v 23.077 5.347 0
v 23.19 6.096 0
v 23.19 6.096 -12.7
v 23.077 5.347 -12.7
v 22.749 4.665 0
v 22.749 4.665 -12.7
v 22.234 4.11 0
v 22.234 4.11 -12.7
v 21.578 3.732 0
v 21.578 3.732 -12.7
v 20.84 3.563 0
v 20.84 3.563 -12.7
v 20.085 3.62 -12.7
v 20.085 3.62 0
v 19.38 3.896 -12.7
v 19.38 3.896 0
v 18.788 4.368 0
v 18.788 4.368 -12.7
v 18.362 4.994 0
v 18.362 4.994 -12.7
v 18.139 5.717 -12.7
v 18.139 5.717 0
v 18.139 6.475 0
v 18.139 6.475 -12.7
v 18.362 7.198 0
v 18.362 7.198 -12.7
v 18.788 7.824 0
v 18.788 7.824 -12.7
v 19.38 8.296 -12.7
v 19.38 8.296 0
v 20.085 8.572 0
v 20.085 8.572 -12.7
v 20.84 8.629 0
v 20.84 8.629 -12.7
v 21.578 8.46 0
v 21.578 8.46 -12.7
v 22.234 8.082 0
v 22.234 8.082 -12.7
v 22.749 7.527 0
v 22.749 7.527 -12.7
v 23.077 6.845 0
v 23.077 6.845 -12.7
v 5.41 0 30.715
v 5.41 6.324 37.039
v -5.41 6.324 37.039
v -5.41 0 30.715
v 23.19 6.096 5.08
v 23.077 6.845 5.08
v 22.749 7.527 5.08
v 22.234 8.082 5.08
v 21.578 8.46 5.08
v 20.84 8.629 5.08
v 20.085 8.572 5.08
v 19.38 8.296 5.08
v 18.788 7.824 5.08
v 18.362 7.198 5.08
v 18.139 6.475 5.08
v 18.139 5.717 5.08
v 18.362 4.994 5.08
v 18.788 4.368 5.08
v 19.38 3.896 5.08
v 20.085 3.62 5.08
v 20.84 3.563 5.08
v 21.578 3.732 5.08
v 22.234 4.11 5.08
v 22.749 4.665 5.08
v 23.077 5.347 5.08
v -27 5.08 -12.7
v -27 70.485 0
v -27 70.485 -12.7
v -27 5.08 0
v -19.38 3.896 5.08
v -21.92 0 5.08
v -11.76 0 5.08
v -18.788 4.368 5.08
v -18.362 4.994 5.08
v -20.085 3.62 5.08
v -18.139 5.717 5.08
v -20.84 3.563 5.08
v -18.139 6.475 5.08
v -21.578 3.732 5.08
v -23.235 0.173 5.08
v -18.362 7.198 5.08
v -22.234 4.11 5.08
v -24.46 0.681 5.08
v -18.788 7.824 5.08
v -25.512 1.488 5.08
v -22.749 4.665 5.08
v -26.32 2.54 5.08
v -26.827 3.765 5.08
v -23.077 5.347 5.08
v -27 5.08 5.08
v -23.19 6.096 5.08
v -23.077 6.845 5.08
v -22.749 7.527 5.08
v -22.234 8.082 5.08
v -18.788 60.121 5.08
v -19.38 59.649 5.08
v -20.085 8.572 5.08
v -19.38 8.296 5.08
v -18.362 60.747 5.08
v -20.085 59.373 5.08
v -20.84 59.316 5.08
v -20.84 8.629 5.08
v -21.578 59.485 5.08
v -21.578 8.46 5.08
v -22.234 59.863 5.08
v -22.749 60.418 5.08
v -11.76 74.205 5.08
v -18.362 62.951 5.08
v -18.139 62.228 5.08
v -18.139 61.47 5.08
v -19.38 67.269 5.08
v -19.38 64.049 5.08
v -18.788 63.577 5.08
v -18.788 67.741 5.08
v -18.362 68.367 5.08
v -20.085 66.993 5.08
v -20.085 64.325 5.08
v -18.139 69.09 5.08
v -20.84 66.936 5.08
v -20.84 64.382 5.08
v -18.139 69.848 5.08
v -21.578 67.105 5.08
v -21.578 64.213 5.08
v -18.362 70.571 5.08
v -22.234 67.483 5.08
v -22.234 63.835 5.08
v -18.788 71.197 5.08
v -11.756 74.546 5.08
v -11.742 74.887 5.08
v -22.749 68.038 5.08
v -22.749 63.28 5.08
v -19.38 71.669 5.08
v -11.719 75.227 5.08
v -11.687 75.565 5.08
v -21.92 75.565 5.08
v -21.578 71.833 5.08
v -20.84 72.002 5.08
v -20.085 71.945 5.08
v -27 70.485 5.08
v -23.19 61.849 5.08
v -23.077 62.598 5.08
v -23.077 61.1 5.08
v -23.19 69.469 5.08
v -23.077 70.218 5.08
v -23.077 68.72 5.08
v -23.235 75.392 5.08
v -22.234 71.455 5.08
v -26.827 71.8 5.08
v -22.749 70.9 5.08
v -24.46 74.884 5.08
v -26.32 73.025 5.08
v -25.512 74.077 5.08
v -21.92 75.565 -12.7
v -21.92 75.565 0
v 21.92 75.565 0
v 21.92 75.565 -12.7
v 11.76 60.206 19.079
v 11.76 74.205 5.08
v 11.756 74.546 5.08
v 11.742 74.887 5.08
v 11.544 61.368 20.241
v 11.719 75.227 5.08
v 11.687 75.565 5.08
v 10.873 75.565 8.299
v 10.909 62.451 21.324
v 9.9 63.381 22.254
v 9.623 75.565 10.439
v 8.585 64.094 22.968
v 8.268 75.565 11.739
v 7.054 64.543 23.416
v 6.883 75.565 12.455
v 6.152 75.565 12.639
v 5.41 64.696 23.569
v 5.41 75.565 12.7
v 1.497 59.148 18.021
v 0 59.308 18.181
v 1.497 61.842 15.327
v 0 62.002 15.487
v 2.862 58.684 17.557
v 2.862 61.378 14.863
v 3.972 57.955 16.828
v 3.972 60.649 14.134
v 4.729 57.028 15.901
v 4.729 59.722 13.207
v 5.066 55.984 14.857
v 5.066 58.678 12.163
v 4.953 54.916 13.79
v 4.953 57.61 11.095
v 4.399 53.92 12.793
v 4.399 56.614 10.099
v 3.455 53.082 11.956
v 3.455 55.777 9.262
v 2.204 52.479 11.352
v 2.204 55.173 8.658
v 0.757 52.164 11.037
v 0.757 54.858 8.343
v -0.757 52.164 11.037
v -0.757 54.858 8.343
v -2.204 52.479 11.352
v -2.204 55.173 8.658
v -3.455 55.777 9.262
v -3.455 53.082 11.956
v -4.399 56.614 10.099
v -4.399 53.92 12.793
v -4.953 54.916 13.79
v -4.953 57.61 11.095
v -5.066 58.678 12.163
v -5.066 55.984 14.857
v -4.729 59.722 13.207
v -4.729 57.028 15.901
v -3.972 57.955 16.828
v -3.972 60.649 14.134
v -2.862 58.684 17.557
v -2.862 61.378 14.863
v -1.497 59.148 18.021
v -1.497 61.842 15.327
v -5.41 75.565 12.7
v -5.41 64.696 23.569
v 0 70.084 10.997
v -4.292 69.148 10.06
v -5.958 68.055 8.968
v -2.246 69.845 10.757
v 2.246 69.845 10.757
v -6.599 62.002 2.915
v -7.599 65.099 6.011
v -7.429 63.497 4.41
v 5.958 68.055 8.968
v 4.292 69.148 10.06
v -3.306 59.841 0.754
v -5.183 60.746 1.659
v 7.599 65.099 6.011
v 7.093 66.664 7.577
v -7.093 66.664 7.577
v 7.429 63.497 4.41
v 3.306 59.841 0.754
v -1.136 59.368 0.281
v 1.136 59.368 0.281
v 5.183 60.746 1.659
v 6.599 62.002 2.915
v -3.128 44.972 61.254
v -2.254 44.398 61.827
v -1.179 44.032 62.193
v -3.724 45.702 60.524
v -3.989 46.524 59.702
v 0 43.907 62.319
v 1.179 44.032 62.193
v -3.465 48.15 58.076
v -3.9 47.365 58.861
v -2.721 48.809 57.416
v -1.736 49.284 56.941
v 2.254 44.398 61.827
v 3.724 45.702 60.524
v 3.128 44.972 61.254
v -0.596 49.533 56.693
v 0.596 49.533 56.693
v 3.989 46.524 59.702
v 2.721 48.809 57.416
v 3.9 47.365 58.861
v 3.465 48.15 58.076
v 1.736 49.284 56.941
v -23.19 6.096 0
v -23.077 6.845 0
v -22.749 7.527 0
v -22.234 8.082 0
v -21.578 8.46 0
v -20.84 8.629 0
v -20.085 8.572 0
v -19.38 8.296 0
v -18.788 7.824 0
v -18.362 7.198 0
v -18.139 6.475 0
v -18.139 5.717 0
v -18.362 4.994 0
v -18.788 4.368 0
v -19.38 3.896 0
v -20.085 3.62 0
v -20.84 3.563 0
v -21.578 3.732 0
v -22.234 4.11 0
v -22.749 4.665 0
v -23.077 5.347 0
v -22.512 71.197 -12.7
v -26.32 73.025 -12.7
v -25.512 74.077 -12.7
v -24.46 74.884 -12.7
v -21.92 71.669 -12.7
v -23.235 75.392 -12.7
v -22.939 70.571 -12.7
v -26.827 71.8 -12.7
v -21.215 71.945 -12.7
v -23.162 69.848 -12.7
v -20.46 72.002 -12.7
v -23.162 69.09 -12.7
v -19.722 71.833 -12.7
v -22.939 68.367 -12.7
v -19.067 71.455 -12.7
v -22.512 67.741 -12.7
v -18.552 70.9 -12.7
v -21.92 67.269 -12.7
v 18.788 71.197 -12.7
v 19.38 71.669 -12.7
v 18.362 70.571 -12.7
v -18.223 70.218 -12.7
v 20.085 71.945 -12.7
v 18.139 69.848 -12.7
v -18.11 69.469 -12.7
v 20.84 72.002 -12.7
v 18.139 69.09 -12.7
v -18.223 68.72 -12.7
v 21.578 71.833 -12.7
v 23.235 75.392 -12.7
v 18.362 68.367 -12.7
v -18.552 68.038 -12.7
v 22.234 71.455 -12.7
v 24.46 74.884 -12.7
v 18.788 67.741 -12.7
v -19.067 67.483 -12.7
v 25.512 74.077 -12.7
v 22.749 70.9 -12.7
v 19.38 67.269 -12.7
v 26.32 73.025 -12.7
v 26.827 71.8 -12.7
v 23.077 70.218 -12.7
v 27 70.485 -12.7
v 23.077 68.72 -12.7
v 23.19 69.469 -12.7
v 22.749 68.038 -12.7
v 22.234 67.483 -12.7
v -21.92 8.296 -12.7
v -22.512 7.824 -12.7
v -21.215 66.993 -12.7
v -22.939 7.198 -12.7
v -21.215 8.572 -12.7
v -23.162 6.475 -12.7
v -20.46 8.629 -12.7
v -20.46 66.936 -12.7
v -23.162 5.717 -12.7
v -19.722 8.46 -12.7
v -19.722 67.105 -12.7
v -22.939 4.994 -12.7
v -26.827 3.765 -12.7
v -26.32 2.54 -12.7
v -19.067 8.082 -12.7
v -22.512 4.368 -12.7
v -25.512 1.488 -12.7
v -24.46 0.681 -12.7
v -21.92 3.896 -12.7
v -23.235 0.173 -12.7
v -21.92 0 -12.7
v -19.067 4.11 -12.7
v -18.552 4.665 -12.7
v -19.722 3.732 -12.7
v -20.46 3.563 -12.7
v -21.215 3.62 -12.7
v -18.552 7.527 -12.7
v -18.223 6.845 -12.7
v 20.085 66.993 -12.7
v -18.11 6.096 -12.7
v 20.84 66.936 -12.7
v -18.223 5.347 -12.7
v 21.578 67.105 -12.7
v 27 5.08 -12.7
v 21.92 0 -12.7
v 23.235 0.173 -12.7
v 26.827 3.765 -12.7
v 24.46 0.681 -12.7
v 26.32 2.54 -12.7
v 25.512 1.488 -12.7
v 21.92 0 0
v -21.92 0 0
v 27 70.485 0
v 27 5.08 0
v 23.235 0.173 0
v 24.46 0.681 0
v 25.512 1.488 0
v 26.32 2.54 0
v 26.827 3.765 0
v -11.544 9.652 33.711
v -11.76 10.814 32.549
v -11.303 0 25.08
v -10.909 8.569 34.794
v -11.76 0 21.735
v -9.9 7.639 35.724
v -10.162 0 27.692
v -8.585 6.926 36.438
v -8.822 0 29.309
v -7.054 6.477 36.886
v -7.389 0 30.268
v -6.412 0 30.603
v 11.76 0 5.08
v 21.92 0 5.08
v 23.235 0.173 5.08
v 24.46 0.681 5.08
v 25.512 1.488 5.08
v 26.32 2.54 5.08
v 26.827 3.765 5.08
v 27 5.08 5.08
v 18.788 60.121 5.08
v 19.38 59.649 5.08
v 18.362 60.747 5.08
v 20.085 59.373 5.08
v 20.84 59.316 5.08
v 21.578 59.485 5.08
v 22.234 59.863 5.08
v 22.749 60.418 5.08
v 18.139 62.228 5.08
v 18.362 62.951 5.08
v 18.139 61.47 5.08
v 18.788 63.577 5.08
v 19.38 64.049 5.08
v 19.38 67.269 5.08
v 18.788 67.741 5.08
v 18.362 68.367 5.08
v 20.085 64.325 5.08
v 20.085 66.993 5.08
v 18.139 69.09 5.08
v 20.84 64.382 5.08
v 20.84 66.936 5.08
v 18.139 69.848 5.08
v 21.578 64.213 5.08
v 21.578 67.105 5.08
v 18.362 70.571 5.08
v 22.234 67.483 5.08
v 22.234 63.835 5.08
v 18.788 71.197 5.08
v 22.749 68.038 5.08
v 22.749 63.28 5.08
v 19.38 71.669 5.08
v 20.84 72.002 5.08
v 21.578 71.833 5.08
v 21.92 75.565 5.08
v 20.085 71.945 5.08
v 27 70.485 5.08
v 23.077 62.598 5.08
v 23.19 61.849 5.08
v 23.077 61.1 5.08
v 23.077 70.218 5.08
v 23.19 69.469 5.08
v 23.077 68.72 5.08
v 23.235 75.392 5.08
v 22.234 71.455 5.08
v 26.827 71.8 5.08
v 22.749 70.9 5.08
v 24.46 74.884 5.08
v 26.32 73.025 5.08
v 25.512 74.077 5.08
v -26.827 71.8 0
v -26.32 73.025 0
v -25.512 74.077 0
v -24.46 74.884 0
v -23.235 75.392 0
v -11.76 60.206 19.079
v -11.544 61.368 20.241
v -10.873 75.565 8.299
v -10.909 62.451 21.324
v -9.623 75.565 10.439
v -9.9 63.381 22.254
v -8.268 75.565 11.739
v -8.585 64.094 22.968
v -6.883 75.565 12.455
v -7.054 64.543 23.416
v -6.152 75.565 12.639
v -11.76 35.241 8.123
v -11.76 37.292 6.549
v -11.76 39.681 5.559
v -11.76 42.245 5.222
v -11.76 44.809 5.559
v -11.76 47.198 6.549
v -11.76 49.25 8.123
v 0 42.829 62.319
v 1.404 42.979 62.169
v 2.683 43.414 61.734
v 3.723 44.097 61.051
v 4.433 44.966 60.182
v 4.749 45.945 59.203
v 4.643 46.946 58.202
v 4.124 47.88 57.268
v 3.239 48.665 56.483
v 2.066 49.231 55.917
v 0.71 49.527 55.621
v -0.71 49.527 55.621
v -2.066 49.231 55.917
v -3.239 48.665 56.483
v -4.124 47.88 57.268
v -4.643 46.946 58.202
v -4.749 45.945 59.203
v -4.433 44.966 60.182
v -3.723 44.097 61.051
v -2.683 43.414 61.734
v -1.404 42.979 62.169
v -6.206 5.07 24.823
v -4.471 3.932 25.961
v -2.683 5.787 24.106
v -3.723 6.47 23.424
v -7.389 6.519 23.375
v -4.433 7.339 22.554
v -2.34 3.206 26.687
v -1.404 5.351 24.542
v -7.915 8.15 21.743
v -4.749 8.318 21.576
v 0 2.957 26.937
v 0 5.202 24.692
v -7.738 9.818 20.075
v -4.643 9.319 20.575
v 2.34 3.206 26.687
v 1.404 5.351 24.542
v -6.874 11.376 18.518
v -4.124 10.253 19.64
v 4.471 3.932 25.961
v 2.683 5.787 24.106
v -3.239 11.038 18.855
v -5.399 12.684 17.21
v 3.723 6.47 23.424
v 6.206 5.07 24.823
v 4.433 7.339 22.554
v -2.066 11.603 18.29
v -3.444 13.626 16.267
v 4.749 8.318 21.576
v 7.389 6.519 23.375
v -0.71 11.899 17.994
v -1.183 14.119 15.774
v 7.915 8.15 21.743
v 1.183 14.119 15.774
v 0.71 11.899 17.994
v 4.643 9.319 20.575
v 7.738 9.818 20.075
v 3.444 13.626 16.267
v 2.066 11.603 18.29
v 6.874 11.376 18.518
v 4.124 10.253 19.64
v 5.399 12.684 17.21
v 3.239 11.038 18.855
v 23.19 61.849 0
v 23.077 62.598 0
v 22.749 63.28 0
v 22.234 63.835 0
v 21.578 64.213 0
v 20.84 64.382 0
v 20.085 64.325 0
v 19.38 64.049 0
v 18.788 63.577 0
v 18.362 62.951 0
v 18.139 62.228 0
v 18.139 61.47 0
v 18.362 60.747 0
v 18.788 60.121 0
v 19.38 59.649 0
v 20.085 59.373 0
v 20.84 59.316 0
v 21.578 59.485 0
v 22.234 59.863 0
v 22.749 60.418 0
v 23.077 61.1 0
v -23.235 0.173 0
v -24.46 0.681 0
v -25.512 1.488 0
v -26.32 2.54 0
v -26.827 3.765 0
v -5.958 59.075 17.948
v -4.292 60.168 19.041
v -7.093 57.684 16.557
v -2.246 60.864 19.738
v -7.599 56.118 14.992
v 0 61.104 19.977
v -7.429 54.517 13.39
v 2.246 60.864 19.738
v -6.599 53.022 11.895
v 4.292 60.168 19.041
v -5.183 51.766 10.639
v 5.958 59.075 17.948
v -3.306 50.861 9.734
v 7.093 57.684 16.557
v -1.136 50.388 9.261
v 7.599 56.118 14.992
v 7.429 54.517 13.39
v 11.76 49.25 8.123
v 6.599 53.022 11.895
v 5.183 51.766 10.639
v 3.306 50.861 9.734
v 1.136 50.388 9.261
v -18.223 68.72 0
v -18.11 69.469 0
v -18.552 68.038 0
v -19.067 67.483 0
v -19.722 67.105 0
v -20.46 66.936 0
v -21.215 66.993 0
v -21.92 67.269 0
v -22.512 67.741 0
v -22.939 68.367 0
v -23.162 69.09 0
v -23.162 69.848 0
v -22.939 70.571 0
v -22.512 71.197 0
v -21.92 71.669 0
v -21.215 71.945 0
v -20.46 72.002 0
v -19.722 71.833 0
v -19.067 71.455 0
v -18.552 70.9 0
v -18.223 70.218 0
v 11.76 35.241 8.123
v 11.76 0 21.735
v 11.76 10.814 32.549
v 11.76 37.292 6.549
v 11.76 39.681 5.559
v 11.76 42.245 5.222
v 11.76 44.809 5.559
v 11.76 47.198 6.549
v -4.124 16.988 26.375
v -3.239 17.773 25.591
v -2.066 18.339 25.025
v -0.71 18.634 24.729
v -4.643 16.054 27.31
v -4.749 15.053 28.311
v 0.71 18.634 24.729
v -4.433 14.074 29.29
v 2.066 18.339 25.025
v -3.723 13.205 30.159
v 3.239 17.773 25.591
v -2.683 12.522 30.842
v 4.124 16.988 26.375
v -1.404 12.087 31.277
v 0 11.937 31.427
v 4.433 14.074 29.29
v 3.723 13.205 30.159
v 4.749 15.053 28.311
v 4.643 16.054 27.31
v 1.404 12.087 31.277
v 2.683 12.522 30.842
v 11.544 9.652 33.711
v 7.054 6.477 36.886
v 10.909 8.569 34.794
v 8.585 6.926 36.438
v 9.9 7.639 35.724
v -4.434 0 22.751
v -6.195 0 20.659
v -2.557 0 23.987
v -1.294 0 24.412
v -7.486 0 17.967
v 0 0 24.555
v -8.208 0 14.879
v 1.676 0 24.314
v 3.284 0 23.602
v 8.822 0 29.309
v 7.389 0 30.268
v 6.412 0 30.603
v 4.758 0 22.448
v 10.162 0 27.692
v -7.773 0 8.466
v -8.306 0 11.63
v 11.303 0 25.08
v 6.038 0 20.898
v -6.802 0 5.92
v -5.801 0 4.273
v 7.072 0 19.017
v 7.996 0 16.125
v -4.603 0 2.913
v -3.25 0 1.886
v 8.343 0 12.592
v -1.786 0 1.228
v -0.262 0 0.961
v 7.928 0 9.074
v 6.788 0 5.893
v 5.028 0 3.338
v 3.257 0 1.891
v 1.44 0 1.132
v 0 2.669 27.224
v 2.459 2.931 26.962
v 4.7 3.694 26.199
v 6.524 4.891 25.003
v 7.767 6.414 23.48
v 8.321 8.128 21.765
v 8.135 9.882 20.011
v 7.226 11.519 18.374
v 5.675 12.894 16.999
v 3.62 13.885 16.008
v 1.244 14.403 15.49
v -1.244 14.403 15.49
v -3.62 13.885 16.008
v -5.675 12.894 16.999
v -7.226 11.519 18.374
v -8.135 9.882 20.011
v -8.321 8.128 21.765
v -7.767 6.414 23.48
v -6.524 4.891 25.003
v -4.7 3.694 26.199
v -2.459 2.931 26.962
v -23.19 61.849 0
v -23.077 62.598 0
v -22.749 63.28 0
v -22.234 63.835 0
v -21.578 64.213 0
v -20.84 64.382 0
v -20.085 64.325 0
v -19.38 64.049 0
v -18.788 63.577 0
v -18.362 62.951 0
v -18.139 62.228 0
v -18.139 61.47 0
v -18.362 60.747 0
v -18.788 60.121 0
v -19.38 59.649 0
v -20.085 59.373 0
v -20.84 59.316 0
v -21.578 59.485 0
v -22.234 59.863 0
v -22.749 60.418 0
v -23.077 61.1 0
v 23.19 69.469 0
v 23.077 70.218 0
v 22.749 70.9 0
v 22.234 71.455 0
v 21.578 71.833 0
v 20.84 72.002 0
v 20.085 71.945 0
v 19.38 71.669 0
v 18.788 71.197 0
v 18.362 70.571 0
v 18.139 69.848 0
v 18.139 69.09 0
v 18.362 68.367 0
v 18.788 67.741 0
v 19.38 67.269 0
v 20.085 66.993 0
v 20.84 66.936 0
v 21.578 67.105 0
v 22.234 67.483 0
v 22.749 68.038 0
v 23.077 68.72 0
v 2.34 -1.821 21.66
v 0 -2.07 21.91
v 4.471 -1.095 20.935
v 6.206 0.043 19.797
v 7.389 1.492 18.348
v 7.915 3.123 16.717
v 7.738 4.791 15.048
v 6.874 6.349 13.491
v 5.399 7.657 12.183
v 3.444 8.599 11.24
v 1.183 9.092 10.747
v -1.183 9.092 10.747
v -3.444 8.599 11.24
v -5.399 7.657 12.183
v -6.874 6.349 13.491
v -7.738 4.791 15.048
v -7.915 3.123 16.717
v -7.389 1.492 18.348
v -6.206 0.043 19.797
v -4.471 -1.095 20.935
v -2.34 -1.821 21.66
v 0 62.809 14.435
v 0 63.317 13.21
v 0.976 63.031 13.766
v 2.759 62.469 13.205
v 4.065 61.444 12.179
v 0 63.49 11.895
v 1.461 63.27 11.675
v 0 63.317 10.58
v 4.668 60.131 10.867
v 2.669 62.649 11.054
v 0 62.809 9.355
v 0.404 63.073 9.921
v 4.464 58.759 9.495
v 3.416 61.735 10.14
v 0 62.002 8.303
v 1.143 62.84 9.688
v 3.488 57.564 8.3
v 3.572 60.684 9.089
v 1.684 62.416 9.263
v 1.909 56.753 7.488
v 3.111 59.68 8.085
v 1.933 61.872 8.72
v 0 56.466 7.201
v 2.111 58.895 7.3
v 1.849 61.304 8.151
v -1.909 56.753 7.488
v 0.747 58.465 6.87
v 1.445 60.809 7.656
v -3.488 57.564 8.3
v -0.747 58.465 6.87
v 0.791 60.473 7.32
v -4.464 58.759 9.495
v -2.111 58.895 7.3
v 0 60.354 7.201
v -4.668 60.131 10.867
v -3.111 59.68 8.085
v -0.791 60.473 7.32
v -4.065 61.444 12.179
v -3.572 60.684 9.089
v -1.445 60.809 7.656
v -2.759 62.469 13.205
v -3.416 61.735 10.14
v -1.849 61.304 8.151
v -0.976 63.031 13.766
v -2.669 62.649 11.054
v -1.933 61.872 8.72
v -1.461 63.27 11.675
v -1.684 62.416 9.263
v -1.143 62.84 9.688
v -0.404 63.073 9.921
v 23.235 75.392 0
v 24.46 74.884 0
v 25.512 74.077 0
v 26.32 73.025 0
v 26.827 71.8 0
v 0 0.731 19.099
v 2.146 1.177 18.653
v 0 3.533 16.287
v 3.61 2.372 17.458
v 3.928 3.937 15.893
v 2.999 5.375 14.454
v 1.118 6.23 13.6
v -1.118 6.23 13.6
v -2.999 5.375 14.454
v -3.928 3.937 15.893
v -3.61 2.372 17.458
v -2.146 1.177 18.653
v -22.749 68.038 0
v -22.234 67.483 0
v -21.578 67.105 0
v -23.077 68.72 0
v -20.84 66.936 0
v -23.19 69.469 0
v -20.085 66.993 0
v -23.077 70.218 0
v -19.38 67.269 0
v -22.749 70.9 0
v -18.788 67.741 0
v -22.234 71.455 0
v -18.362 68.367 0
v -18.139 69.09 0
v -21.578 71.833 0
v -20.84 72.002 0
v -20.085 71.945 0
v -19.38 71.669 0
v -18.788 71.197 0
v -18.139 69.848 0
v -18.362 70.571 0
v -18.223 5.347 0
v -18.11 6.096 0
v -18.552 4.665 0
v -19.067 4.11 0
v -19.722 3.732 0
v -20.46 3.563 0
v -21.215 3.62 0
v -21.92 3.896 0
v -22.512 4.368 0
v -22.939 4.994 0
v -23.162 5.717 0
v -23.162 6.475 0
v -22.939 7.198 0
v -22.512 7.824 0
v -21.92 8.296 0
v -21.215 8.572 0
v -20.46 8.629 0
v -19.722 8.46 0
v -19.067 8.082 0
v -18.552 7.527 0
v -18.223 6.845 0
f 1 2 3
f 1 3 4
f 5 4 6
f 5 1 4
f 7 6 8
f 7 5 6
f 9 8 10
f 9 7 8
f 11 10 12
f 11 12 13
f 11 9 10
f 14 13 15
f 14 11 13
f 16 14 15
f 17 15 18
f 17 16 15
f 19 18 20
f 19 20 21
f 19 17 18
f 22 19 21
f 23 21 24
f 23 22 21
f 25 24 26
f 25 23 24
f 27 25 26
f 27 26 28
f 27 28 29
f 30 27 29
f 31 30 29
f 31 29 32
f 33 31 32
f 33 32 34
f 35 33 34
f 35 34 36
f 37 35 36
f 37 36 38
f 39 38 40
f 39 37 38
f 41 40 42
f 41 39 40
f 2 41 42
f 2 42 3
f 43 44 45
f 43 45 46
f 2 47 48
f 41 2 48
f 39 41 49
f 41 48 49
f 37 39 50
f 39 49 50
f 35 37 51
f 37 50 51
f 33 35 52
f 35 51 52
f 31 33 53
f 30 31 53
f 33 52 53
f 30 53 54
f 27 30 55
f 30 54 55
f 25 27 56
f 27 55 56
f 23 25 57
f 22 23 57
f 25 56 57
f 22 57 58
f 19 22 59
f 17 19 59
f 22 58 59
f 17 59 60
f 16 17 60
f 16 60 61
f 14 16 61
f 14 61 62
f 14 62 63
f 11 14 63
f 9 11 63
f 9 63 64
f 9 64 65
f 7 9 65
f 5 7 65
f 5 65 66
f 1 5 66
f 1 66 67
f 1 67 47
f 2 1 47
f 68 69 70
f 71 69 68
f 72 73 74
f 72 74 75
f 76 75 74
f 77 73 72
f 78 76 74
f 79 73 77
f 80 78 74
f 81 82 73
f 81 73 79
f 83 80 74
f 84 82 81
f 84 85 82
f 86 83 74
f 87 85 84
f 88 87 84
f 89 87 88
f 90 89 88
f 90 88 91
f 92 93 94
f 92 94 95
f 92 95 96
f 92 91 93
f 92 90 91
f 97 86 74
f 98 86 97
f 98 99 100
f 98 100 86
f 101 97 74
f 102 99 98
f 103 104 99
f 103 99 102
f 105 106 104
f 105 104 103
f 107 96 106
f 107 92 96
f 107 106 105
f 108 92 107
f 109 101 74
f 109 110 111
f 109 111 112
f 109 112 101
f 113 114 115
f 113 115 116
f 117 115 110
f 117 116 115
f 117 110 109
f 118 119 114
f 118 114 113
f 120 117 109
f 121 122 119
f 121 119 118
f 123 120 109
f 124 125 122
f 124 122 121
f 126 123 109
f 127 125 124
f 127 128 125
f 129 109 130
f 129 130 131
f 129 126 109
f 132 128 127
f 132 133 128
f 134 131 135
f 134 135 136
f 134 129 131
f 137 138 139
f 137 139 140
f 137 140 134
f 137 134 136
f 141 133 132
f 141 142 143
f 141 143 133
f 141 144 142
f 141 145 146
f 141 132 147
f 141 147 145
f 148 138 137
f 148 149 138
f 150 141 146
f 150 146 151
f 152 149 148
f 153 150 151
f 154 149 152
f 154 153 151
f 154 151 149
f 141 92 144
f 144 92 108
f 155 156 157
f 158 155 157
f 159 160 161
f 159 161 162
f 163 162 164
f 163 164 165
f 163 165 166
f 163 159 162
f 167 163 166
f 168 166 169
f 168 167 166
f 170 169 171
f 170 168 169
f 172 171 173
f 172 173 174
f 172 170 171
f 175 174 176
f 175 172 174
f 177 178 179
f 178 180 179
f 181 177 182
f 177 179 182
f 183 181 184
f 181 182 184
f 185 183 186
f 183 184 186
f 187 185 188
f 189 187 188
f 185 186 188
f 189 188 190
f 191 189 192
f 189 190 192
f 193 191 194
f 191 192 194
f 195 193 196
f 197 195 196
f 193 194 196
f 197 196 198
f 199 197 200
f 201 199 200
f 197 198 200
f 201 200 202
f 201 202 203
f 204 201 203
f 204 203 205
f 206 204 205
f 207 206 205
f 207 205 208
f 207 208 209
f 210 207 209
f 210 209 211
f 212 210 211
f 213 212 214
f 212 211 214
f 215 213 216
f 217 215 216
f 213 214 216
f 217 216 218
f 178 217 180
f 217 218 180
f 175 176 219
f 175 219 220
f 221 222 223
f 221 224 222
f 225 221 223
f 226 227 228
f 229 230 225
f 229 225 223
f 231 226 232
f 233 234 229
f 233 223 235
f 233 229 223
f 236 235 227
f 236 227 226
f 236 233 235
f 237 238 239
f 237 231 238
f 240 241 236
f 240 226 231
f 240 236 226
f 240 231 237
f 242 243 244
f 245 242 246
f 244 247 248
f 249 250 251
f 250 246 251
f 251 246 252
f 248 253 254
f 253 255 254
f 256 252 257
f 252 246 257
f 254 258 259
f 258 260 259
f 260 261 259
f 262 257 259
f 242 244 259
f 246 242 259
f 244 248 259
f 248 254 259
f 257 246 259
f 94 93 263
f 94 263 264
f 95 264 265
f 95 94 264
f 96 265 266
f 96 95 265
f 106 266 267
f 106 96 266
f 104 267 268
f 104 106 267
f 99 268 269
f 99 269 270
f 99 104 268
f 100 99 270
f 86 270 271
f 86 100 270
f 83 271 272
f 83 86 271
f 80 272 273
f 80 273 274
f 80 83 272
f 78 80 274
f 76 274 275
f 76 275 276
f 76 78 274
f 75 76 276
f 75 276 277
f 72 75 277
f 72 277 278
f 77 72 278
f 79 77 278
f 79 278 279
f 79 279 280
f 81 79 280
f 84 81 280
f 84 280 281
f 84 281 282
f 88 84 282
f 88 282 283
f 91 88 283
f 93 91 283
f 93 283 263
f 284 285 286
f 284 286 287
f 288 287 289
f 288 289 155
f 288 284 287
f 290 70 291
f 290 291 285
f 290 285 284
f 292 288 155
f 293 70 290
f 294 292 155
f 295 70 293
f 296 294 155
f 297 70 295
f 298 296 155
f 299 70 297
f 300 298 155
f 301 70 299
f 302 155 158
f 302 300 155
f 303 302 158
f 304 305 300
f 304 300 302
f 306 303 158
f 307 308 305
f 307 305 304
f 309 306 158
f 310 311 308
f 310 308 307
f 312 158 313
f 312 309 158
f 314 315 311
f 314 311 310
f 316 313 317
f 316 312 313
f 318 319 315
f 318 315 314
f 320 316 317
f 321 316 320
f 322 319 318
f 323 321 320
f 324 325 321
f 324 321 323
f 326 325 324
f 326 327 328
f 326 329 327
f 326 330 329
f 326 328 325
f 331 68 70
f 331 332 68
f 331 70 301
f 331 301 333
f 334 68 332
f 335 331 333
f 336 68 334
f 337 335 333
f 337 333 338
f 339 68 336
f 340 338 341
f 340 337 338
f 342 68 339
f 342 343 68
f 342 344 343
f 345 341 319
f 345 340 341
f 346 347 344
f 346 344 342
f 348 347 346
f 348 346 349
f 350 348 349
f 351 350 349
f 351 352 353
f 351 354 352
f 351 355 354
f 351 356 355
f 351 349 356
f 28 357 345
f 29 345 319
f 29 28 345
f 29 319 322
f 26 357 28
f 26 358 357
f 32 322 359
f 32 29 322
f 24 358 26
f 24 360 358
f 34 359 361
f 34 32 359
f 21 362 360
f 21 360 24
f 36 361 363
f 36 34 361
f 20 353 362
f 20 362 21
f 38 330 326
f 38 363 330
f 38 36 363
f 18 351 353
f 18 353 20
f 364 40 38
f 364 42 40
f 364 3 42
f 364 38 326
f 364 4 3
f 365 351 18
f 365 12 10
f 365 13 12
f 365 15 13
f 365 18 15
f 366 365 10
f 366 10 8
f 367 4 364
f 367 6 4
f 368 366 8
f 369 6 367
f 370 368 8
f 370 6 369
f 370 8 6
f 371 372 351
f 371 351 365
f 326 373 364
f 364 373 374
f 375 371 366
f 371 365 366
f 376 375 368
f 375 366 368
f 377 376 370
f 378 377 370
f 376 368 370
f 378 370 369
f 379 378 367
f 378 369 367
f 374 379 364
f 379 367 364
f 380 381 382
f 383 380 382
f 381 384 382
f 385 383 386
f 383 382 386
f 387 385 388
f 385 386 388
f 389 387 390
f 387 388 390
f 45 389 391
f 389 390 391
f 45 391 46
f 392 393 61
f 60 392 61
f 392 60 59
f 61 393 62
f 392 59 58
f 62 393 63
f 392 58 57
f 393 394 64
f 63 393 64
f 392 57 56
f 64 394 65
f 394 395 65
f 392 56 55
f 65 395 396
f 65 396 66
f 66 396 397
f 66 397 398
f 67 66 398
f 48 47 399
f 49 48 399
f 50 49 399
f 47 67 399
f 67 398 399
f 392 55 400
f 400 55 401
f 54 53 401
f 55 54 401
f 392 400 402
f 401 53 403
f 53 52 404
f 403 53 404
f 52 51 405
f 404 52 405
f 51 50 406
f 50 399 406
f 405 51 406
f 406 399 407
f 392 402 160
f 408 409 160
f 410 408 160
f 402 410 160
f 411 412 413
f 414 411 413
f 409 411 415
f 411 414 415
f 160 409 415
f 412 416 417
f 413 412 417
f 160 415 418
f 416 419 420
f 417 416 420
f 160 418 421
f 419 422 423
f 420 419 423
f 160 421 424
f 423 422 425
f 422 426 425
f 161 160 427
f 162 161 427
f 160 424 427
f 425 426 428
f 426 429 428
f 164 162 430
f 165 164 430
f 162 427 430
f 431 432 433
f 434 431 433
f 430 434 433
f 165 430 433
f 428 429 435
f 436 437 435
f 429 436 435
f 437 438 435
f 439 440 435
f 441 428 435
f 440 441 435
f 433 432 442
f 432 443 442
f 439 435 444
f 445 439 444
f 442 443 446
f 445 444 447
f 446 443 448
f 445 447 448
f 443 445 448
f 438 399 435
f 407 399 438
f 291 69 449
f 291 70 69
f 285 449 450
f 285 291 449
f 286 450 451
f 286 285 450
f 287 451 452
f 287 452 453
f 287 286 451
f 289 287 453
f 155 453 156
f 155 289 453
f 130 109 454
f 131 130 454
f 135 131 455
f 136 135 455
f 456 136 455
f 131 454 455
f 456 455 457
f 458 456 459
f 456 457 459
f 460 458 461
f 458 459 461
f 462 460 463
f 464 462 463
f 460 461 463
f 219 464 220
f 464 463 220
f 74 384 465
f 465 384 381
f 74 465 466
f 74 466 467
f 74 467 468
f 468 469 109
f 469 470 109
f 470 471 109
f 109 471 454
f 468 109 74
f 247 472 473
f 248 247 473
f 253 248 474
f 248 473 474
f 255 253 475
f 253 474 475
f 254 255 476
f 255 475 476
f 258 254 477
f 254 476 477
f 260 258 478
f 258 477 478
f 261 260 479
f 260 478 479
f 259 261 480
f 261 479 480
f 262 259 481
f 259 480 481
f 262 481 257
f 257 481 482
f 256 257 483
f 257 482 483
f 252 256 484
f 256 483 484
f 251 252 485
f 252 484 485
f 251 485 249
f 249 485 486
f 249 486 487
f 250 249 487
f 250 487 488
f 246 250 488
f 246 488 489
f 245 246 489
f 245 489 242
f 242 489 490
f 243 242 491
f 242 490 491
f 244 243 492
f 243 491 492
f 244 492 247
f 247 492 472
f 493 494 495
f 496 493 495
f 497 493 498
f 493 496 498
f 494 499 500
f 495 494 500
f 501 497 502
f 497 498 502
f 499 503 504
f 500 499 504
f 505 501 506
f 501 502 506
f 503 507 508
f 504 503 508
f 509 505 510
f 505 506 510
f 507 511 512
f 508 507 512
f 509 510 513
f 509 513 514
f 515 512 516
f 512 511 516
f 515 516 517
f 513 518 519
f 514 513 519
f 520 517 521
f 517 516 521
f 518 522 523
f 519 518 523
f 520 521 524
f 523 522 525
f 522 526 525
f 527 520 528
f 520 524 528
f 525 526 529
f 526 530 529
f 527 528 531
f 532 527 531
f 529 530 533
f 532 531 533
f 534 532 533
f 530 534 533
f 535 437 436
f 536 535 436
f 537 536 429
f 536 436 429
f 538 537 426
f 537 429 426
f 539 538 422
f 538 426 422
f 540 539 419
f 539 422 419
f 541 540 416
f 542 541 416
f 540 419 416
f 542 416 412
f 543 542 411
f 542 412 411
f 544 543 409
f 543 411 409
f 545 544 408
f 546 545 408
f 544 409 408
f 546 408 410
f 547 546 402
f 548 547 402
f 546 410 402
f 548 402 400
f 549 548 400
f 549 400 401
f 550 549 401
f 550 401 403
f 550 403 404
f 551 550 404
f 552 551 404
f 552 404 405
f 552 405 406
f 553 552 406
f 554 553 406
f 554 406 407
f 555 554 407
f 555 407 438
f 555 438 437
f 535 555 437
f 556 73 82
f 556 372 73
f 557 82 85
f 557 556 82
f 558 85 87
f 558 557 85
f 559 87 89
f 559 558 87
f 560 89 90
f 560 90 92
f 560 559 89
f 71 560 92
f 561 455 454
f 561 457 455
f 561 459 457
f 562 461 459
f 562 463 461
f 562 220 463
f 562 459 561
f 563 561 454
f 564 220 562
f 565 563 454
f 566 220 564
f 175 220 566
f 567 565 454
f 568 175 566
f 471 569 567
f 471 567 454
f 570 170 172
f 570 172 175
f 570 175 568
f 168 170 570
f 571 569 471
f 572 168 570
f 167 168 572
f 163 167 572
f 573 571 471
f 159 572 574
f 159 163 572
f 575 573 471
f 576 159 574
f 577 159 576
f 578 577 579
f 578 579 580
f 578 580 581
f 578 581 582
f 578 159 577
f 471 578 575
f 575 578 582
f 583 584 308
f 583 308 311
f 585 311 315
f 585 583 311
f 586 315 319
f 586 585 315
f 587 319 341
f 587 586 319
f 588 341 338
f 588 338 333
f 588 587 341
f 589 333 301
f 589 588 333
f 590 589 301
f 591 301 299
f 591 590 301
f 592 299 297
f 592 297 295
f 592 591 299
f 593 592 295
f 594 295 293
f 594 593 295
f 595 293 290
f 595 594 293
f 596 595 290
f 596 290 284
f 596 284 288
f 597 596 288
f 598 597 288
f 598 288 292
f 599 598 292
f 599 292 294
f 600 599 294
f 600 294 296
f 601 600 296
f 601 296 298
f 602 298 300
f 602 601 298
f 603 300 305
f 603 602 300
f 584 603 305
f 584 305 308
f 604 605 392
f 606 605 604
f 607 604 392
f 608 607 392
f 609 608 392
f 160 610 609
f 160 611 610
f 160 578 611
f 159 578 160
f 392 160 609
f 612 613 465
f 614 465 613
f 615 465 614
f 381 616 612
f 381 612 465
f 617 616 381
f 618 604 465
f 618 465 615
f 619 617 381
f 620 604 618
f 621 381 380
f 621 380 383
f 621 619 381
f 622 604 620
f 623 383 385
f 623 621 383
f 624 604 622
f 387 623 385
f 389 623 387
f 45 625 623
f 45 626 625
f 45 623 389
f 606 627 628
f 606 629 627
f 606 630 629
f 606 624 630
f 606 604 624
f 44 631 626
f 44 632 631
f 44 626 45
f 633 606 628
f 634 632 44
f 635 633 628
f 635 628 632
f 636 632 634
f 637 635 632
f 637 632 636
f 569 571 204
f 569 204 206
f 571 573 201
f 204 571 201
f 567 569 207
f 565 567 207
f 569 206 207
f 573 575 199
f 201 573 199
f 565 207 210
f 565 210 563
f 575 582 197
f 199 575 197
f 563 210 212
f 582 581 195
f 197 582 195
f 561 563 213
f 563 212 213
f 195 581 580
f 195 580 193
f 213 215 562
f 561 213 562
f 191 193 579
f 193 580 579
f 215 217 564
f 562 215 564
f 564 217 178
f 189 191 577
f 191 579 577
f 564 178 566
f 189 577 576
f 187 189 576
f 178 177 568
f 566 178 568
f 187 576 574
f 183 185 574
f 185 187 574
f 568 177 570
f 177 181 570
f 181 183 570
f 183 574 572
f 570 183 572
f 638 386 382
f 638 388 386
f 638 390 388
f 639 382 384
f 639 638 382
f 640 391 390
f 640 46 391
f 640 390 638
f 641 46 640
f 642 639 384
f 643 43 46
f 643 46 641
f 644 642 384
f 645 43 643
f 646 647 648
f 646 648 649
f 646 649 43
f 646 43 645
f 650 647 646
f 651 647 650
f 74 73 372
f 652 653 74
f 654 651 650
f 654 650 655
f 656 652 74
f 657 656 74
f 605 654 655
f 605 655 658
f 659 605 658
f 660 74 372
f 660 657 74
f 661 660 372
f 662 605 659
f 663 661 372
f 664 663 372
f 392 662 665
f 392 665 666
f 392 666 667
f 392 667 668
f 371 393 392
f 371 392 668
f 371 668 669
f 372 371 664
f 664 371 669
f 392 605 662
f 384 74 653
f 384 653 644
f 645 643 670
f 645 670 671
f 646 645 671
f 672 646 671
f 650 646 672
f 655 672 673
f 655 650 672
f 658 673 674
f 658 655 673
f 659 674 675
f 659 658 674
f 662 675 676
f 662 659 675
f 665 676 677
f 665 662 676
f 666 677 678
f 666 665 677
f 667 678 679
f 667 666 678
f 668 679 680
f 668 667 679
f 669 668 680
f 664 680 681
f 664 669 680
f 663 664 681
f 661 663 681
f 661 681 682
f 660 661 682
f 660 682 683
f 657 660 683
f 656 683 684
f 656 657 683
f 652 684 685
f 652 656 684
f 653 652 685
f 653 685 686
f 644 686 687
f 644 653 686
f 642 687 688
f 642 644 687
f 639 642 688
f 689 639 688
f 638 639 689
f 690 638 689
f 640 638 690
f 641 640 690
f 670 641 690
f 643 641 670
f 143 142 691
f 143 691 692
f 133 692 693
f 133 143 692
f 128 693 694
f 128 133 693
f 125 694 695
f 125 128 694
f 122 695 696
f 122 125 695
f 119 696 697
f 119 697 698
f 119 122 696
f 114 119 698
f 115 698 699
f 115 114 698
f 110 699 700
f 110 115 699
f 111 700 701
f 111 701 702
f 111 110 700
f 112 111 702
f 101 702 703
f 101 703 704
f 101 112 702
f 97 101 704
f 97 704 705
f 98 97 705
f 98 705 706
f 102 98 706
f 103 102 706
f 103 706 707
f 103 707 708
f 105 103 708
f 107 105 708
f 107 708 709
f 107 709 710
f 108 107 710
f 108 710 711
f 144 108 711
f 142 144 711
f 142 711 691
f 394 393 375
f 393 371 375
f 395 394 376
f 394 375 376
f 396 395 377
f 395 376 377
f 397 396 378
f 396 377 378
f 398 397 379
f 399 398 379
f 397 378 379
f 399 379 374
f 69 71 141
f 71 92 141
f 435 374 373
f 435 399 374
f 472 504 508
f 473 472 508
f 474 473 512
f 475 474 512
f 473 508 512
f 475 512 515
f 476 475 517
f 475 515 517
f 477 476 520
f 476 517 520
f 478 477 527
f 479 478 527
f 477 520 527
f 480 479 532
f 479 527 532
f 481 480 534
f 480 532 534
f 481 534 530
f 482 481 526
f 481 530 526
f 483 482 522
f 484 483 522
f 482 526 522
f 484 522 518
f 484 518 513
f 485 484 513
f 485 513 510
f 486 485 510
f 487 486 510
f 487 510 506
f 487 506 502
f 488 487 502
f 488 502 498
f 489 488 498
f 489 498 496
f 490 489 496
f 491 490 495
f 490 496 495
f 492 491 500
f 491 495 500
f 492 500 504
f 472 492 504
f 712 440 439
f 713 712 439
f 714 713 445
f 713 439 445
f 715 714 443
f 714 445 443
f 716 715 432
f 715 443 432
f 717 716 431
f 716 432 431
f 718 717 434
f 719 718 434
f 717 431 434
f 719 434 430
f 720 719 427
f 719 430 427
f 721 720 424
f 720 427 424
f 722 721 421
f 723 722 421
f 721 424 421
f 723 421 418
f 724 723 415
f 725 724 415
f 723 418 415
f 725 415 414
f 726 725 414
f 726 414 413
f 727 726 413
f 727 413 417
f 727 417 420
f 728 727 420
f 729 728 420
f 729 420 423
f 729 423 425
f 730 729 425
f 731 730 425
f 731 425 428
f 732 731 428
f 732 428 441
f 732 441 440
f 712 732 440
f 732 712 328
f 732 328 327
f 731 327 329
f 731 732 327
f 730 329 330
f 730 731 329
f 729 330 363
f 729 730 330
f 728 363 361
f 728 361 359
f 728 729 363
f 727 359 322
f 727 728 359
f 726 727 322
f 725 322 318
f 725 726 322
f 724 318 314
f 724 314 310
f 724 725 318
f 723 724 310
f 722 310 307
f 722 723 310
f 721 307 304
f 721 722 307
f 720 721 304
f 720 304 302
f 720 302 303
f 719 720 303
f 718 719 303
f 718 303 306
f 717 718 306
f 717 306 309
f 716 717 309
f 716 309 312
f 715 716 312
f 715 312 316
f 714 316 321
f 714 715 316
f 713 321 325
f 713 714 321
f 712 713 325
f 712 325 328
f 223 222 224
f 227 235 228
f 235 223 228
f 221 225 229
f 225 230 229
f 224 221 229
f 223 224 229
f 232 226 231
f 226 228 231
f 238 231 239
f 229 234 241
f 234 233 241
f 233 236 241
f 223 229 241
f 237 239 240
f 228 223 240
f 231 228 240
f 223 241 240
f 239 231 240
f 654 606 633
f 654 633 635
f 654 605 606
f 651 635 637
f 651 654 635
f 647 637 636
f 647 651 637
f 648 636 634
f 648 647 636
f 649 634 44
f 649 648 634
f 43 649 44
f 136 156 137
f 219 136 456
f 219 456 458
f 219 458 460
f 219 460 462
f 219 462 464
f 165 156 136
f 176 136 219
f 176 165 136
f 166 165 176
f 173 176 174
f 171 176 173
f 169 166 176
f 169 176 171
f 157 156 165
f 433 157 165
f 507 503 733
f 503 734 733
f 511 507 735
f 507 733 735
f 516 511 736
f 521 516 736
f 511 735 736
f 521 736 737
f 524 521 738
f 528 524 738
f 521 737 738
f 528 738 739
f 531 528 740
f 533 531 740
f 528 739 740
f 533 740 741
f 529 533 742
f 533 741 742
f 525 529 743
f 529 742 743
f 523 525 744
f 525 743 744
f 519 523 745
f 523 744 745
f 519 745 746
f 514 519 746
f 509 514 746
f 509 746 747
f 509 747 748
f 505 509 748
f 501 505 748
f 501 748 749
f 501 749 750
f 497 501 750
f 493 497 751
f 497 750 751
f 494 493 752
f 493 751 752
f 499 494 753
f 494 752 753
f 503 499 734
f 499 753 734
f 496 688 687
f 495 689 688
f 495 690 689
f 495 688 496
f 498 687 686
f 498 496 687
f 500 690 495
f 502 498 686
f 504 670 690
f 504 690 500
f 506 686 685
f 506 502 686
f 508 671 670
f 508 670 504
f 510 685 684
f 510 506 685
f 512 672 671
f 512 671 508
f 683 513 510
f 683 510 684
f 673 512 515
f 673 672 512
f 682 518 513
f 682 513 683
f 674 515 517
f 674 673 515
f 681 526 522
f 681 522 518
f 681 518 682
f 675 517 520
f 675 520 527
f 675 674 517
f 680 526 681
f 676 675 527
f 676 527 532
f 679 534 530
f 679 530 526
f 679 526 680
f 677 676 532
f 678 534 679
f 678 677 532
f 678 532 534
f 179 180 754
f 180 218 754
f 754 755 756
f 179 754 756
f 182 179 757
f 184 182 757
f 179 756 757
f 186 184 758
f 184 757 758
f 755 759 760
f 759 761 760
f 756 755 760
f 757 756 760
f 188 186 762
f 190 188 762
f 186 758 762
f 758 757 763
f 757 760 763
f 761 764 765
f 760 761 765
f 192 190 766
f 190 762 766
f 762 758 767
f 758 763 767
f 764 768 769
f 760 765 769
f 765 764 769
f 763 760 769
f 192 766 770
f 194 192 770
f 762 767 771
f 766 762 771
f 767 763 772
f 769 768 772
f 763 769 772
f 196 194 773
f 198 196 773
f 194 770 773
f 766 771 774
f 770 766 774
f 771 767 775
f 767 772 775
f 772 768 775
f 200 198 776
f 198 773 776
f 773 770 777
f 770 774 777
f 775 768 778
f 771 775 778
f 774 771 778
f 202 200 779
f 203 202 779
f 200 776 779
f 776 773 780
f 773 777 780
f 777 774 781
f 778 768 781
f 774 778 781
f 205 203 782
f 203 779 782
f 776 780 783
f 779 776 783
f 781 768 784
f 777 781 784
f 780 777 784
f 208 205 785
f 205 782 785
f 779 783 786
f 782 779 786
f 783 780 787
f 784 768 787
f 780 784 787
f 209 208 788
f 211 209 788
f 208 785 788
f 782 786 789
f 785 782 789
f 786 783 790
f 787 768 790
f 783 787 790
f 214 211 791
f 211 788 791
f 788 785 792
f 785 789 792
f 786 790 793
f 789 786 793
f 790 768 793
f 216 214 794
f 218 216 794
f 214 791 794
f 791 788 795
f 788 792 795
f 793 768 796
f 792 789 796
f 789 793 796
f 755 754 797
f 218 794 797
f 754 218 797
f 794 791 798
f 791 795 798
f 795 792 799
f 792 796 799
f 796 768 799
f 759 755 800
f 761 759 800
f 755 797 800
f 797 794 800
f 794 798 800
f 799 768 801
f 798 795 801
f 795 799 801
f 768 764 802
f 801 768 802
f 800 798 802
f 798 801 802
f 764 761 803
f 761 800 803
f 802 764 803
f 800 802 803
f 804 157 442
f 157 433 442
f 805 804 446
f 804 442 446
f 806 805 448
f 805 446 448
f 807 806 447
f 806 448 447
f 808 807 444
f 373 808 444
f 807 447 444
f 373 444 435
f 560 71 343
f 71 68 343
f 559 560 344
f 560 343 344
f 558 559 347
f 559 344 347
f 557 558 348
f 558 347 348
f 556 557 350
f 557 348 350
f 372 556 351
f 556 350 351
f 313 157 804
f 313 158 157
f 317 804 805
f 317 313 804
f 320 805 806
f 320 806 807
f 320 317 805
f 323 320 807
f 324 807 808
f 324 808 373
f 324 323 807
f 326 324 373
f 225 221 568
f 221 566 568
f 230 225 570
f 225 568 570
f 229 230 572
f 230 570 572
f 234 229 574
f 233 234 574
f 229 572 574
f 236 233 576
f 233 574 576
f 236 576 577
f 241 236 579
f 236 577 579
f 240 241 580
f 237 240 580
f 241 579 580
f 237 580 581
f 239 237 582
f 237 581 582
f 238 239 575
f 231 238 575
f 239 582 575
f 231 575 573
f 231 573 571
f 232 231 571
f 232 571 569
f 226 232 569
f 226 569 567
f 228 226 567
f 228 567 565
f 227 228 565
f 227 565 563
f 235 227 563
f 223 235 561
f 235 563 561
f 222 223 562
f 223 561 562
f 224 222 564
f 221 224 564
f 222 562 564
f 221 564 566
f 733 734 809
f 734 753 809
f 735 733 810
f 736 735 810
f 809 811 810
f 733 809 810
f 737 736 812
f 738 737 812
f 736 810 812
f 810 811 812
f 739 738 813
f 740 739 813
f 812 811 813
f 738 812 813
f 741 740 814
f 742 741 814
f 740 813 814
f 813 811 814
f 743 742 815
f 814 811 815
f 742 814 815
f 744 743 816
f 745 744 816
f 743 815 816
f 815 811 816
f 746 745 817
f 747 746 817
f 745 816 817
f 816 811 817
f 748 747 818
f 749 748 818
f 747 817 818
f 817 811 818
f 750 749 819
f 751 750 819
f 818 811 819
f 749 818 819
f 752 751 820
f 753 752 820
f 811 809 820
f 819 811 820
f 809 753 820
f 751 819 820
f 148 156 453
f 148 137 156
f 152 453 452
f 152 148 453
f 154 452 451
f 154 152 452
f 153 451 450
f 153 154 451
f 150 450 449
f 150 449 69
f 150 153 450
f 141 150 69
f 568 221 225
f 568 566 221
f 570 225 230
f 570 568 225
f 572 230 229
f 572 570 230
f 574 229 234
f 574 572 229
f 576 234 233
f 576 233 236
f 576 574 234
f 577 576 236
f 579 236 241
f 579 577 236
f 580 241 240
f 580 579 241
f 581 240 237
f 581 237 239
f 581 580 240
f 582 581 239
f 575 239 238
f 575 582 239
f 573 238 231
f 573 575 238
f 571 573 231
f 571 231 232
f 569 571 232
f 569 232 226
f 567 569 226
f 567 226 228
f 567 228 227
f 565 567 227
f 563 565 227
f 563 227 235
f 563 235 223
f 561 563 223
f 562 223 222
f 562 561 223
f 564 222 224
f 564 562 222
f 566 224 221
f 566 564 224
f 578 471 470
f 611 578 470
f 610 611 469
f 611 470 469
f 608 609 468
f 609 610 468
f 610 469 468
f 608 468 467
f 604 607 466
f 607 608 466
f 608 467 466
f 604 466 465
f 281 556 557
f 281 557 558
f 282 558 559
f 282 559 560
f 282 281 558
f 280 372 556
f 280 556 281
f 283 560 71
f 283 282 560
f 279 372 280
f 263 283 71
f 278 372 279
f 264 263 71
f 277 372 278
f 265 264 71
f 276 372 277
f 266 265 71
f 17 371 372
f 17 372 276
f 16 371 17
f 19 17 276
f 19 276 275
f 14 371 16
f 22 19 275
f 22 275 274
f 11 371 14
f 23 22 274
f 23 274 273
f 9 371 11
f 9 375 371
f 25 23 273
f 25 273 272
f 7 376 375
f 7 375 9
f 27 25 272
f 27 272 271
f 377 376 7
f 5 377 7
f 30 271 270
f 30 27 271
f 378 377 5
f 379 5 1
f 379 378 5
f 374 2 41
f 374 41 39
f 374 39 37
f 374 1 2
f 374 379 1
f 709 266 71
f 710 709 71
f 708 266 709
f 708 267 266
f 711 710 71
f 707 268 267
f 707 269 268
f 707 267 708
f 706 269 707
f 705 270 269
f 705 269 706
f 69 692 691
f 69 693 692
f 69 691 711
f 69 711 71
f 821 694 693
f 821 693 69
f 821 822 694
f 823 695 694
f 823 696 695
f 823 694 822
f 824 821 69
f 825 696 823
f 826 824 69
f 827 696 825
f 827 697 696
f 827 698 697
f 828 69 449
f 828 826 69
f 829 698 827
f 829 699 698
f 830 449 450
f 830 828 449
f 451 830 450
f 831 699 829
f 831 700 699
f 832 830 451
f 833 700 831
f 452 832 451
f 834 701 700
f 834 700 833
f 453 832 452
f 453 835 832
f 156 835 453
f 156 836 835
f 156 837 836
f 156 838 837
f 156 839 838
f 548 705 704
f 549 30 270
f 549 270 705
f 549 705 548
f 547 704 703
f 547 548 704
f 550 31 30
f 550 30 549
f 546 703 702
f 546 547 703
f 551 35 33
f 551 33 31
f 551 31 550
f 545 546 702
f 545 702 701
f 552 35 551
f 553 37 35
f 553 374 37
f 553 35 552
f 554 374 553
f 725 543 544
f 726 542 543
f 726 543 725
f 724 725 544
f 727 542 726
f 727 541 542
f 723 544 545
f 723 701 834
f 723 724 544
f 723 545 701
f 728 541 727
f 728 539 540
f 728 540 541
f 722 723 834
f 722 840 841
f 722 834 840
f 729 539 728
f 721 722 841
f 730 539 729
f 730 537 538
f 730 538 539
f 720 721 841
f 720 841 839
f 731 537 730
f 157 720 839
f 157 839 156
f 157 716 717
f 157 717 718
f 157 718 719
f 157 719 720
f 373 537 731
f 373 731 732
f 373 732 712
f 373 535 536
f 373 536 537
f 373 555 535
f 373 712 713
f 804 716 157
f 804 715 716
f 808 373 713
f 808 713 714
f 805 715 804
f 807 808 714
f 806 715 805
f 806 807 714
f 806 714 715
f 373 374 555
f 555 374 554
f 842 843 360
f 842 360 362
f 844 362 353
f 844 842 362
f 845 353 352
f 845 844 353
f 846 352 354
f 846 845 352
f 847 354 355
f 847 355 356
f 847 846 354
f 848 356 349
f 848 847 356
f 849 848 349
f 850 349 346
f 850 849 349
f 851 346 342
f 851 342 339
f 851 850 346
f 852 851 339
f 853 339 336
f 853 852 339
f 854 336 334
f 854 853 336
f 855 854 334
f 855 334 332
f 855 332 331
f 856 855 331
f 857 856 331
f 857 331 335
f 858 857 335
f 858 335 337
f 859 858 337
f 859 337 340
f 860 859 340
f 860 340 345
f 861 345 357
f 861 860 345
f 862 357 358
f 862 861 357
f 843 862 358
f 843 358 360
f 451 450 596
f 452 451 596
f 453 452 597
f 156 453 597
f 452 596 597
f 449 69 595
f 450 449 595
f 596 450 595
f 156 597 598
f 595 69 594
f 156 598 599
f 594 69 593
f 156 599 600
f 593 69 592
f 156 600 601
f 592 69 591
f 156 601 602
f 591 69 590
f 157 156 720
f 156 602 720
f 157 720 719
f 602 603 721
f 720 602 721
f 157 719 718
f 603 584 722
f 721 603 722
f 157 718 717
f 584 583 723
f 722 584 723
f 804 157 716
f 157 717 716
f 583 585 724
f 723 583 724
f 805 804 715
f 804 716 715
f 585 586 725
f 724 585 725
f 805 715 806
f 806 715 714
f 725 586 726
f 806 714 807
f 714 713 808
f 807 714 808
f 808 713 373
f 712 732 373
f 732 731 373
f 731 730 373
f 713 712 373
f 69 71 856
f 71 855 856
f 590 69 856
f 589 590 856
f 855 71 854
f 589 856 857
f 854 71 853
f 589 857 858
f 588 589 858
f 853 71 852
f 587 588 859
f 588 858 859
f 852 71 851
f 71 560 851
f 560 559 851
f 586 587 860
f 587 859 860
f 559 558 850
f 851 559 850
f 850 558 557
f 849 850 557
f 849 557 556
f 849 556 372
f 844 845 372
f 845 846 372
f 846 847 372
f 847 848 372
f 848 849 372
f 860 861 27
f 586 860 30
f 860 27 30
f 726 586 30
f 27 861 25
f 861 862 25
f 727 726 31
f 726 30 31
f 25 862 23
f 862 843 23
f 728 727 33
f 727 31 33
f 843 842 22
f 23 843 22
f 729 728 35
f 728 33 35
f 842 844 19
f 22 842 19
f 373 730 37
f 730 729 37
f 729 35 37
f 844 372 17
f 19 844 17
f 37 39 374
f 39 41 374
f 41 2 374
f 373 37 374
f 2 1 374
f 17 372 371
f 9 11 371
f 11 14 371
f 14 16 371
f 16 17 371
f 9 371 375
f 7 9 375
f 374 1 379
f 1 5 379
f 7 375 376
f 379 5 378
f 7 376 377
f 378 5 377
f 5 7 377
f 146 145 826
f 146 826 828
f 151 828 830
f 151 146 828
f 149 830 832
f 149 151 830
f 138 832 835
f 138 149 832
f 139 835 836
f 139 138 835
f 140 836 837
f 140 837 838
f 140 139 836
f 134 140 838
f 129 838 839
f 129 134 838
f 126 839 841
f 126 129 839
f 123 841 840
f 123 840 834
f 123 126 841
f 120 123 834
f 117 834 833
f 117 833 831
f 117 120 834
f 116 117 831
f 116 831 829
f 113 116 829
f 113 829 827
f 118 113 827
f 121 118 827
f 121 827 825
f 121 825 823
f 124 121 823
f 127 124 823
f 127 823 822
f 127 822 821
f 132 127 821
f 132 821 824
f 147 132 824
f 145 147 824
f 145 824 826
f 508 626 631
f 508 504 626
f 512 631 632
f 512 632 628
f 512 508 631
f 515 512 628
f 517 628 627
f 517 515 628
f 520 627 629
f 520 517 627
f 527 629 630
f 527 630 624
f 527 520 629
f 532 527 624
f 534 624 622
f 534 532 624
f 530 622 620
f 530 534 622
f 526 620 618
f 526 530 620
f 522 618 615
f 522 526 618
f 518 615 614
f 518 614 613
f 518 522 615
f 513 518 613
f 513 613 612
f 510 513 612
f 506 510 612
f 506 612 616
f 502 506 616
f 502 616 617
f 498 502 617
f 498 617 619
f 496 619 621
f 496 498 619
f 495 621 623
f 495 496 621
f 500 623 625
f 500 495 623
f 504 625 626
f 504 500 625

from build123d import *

# Parameters (mm, degrees)
F1_DEPTH  = 27.0002
F2_R      = 9.906
F3_W      = 75.565
F3_H      = 31.9594877579
F4_DEPTH  = 15.24
F6_R      = 6.35
F7_R      = 5.08
F5_R      = 2.54
F8_DEPTH  = 5.081
F14_SIZE  = 0.762
F19_W     = 54.0004
F19_H     = 75.565
F19_R     = 2.54
F20_DEPTH = 12.7
F21_R     = 5.08


with BuildPart() as f1:
    # F0 (on Right) → F1 (new body)
    with BuildSketch(Plane.YZ):
        Polygon((0, 30.7152561211), (0, 0), (75.565, 0), (75.565, 12.7), (64.6958964237, 23.5691035763), (42.2452561211, 1.1184632736), (6.3242316368, 37.0394877579), align=None)
    extrude(amount=F1_DEPTH)

    # F2
    f2_edges = [f1.edges().sort_by_distance(p)[0] for p in [
        (13.5001, 42.245256, 1.118463),
    ]]
    fillet(f2_edges, radius=F2_R)

    # F3 (on face) → F4 (cut)
    with BuildSketch(Plane.YZ.offset(27.0002)):
        with Locations((37.7825, 21.0597438789)):
            Rectangle(F3_W, F3_H)
    extrude(amount=-F4_DEPTH, mode=Mode.SUBTRACT)

    # F6
    f6_edges = [f1.edges().sort_by_distance(p)[0] for p in [
        (11.7602, 3.162116, 33.877372),
        (11.7602, 70.130448, 18.134552),
    ]]
    fillet(f6_edges, radius=F6_R)

    # F7
    f7_edges = [f1.edges().sort_by_distance(p)[0] for p in [
        (27.0002, 0, 2.54),
        (27.0002, 75.565, 2.54),
    ]]
    fillet(f7_edges, radius=F7_R)

    # F5 (on face) → F8 (cut, through all)
    with BuildSketch(Plane.XY.offset(5.08)):
        with Locations((20.6502, 69.469)):
            Circle(F5_R)
        with Locations((20.6502, 61.849)):
            Circle(F5_R)
        with Locations((20.6502, 6.096)):
            Circle(F5_R)
    extrude(amount=-F8_DEPTH, mode=Mode.SUBTRACT)

    # F9: F1 across face


with BuildPart() as f1_1:
    add(f1.part)
    add(f1.part.mirror(Plane(origin=(0, 31.4337361572, 11.6287579026), x_dir=(0, 1, 0), z_dir=(-1, 0, 0))))

    # F10 (on Right) → F11 (revolve, cut)
    with BuildSketch(Plane.YZ):
        Polygon((-6.3773719395, 6.3773719395), (15.3044877579, 28.0592316368), (11.9368917125, 31.4268276822), (5.2016996217, 24.6916355914), (2.6692673955, 27.2240678175), (-12.277400211, 12.277400211), align=None)
    revolve(axis=Axis((0, 22.0396798487, 34.7944237276), (0, 0.7071067812, 0.7071067812)), mode=Mode.SUBTRACT)

    # F15 (on Right) → F16 (revolve, cut)
    with BuildSketch(Plane.YZ):
        Polygon((64.6958964237, 5.6085913341), (70.0840500964, 10.9967450068), (61.1037939753, 19.9770011278), (55.7156403027, 14.5888474552), align=None)
    revolve(axis=Axis((0, 46.7353841816, 23.5691035763), (0, 0.7071067812, -0.7071067812)), mode=Mode.SUBTRACT)


with BuildPart() as f13:
    # F12 (on Right) → F13 (revolve)
    with BuildSketch(Plane.YZ):
        Polygon((11.9368917125, 31.4268276822), (5.2016996217, 24.6916355914), (2.9566355914, 26.9366996217), (-2.0702565748, 21.9098074555), (3.5326075511, 16.2873514301), (46.7353841816, 59.4901280605), (43.3677881362, 62.8577241059), align=None)
    revolve(axis=Axis((0, 25.1339958664, 37.8887397453), (0, 0.7071067812, 0.7071067812)))

    # F14
    f14_edges = [f13.edges().sort_by_distance(p)[0] for p in [
        (0, 50.10298, 56.122532),
    ]]
    chamfer(f14_edges, length=F14_SIZE)


with BuildPart() as f18:
    # F17 (on Right) → F18 (revolve)
    with BuildSketch(Plane.YZ):
        with BuildLine():
            ThreePointArc((62.0018195874, 15.4868730673), (63.489717139, 11.8947706189), (62.0018195874, 8.3026681704))
            Line((62.0018195874, 8.3026681704), (64.6958964237, 5.6085913341))
            Line((64.6958964237, 5.6085913341), (70.0840500964, 10.9967450068))
            Line((70.0840500964, 10.9967450068), (61.1037939753, 19.9770011278))
            Line((61.1037939753, 19.9770011278), (59.3077427511, 18.1809499036))
            Line((59.3077427511, 18.1809499036), (62.0018195874, 15.4868730673))
        make_face()
    revolve(axis=Axis((0, 63.3488580056, 6.9556297523), (0, 0.7071067812, -0.7071067812)))


with BuildPart() as f20:
    # F19 (on face) → F20 (new body)
    with BuildSketch(Plane(origin=(0, 0, 0), x_dir=(1, 0, 0), z_dir=(0, 0, -1))):
        with Locations((0, -37.7825)):
            Rectangle(F19_W, F19_H)
        with Locations((-20.6502, -69.469)):
            Circle(F19_R, mode=Mode.SUBTRACT)
        with Locations((20.6502, -69.469)):
            Circle(F19_R, mode=Mode.SUBTRACT)
        with Locations((-20.6502, -6.096)):
            Circle(F19_R, mode=Mode.SUBTRACT)
        with Locations((20.6502, -6.096)):
            Circle(F19_R, mode=Mode.SUBTRACT)
    extrude(amount=F20_DEPTH)

    # F21
    f21_edges = [f20.edges().sort_by_distance(p)[0] for p in [
        (27.0002, 0, -6.35),
        (27.0002, 75.565, -6.35),
        (-27.0002, 0, -6.35),
        (-27.0002, 75.565, -6.35),
    ]]
    fillet(f21_edges, radius=F21_R)


solid = Compound([f1_1.part, f13.part, f18.part, f20.part])
